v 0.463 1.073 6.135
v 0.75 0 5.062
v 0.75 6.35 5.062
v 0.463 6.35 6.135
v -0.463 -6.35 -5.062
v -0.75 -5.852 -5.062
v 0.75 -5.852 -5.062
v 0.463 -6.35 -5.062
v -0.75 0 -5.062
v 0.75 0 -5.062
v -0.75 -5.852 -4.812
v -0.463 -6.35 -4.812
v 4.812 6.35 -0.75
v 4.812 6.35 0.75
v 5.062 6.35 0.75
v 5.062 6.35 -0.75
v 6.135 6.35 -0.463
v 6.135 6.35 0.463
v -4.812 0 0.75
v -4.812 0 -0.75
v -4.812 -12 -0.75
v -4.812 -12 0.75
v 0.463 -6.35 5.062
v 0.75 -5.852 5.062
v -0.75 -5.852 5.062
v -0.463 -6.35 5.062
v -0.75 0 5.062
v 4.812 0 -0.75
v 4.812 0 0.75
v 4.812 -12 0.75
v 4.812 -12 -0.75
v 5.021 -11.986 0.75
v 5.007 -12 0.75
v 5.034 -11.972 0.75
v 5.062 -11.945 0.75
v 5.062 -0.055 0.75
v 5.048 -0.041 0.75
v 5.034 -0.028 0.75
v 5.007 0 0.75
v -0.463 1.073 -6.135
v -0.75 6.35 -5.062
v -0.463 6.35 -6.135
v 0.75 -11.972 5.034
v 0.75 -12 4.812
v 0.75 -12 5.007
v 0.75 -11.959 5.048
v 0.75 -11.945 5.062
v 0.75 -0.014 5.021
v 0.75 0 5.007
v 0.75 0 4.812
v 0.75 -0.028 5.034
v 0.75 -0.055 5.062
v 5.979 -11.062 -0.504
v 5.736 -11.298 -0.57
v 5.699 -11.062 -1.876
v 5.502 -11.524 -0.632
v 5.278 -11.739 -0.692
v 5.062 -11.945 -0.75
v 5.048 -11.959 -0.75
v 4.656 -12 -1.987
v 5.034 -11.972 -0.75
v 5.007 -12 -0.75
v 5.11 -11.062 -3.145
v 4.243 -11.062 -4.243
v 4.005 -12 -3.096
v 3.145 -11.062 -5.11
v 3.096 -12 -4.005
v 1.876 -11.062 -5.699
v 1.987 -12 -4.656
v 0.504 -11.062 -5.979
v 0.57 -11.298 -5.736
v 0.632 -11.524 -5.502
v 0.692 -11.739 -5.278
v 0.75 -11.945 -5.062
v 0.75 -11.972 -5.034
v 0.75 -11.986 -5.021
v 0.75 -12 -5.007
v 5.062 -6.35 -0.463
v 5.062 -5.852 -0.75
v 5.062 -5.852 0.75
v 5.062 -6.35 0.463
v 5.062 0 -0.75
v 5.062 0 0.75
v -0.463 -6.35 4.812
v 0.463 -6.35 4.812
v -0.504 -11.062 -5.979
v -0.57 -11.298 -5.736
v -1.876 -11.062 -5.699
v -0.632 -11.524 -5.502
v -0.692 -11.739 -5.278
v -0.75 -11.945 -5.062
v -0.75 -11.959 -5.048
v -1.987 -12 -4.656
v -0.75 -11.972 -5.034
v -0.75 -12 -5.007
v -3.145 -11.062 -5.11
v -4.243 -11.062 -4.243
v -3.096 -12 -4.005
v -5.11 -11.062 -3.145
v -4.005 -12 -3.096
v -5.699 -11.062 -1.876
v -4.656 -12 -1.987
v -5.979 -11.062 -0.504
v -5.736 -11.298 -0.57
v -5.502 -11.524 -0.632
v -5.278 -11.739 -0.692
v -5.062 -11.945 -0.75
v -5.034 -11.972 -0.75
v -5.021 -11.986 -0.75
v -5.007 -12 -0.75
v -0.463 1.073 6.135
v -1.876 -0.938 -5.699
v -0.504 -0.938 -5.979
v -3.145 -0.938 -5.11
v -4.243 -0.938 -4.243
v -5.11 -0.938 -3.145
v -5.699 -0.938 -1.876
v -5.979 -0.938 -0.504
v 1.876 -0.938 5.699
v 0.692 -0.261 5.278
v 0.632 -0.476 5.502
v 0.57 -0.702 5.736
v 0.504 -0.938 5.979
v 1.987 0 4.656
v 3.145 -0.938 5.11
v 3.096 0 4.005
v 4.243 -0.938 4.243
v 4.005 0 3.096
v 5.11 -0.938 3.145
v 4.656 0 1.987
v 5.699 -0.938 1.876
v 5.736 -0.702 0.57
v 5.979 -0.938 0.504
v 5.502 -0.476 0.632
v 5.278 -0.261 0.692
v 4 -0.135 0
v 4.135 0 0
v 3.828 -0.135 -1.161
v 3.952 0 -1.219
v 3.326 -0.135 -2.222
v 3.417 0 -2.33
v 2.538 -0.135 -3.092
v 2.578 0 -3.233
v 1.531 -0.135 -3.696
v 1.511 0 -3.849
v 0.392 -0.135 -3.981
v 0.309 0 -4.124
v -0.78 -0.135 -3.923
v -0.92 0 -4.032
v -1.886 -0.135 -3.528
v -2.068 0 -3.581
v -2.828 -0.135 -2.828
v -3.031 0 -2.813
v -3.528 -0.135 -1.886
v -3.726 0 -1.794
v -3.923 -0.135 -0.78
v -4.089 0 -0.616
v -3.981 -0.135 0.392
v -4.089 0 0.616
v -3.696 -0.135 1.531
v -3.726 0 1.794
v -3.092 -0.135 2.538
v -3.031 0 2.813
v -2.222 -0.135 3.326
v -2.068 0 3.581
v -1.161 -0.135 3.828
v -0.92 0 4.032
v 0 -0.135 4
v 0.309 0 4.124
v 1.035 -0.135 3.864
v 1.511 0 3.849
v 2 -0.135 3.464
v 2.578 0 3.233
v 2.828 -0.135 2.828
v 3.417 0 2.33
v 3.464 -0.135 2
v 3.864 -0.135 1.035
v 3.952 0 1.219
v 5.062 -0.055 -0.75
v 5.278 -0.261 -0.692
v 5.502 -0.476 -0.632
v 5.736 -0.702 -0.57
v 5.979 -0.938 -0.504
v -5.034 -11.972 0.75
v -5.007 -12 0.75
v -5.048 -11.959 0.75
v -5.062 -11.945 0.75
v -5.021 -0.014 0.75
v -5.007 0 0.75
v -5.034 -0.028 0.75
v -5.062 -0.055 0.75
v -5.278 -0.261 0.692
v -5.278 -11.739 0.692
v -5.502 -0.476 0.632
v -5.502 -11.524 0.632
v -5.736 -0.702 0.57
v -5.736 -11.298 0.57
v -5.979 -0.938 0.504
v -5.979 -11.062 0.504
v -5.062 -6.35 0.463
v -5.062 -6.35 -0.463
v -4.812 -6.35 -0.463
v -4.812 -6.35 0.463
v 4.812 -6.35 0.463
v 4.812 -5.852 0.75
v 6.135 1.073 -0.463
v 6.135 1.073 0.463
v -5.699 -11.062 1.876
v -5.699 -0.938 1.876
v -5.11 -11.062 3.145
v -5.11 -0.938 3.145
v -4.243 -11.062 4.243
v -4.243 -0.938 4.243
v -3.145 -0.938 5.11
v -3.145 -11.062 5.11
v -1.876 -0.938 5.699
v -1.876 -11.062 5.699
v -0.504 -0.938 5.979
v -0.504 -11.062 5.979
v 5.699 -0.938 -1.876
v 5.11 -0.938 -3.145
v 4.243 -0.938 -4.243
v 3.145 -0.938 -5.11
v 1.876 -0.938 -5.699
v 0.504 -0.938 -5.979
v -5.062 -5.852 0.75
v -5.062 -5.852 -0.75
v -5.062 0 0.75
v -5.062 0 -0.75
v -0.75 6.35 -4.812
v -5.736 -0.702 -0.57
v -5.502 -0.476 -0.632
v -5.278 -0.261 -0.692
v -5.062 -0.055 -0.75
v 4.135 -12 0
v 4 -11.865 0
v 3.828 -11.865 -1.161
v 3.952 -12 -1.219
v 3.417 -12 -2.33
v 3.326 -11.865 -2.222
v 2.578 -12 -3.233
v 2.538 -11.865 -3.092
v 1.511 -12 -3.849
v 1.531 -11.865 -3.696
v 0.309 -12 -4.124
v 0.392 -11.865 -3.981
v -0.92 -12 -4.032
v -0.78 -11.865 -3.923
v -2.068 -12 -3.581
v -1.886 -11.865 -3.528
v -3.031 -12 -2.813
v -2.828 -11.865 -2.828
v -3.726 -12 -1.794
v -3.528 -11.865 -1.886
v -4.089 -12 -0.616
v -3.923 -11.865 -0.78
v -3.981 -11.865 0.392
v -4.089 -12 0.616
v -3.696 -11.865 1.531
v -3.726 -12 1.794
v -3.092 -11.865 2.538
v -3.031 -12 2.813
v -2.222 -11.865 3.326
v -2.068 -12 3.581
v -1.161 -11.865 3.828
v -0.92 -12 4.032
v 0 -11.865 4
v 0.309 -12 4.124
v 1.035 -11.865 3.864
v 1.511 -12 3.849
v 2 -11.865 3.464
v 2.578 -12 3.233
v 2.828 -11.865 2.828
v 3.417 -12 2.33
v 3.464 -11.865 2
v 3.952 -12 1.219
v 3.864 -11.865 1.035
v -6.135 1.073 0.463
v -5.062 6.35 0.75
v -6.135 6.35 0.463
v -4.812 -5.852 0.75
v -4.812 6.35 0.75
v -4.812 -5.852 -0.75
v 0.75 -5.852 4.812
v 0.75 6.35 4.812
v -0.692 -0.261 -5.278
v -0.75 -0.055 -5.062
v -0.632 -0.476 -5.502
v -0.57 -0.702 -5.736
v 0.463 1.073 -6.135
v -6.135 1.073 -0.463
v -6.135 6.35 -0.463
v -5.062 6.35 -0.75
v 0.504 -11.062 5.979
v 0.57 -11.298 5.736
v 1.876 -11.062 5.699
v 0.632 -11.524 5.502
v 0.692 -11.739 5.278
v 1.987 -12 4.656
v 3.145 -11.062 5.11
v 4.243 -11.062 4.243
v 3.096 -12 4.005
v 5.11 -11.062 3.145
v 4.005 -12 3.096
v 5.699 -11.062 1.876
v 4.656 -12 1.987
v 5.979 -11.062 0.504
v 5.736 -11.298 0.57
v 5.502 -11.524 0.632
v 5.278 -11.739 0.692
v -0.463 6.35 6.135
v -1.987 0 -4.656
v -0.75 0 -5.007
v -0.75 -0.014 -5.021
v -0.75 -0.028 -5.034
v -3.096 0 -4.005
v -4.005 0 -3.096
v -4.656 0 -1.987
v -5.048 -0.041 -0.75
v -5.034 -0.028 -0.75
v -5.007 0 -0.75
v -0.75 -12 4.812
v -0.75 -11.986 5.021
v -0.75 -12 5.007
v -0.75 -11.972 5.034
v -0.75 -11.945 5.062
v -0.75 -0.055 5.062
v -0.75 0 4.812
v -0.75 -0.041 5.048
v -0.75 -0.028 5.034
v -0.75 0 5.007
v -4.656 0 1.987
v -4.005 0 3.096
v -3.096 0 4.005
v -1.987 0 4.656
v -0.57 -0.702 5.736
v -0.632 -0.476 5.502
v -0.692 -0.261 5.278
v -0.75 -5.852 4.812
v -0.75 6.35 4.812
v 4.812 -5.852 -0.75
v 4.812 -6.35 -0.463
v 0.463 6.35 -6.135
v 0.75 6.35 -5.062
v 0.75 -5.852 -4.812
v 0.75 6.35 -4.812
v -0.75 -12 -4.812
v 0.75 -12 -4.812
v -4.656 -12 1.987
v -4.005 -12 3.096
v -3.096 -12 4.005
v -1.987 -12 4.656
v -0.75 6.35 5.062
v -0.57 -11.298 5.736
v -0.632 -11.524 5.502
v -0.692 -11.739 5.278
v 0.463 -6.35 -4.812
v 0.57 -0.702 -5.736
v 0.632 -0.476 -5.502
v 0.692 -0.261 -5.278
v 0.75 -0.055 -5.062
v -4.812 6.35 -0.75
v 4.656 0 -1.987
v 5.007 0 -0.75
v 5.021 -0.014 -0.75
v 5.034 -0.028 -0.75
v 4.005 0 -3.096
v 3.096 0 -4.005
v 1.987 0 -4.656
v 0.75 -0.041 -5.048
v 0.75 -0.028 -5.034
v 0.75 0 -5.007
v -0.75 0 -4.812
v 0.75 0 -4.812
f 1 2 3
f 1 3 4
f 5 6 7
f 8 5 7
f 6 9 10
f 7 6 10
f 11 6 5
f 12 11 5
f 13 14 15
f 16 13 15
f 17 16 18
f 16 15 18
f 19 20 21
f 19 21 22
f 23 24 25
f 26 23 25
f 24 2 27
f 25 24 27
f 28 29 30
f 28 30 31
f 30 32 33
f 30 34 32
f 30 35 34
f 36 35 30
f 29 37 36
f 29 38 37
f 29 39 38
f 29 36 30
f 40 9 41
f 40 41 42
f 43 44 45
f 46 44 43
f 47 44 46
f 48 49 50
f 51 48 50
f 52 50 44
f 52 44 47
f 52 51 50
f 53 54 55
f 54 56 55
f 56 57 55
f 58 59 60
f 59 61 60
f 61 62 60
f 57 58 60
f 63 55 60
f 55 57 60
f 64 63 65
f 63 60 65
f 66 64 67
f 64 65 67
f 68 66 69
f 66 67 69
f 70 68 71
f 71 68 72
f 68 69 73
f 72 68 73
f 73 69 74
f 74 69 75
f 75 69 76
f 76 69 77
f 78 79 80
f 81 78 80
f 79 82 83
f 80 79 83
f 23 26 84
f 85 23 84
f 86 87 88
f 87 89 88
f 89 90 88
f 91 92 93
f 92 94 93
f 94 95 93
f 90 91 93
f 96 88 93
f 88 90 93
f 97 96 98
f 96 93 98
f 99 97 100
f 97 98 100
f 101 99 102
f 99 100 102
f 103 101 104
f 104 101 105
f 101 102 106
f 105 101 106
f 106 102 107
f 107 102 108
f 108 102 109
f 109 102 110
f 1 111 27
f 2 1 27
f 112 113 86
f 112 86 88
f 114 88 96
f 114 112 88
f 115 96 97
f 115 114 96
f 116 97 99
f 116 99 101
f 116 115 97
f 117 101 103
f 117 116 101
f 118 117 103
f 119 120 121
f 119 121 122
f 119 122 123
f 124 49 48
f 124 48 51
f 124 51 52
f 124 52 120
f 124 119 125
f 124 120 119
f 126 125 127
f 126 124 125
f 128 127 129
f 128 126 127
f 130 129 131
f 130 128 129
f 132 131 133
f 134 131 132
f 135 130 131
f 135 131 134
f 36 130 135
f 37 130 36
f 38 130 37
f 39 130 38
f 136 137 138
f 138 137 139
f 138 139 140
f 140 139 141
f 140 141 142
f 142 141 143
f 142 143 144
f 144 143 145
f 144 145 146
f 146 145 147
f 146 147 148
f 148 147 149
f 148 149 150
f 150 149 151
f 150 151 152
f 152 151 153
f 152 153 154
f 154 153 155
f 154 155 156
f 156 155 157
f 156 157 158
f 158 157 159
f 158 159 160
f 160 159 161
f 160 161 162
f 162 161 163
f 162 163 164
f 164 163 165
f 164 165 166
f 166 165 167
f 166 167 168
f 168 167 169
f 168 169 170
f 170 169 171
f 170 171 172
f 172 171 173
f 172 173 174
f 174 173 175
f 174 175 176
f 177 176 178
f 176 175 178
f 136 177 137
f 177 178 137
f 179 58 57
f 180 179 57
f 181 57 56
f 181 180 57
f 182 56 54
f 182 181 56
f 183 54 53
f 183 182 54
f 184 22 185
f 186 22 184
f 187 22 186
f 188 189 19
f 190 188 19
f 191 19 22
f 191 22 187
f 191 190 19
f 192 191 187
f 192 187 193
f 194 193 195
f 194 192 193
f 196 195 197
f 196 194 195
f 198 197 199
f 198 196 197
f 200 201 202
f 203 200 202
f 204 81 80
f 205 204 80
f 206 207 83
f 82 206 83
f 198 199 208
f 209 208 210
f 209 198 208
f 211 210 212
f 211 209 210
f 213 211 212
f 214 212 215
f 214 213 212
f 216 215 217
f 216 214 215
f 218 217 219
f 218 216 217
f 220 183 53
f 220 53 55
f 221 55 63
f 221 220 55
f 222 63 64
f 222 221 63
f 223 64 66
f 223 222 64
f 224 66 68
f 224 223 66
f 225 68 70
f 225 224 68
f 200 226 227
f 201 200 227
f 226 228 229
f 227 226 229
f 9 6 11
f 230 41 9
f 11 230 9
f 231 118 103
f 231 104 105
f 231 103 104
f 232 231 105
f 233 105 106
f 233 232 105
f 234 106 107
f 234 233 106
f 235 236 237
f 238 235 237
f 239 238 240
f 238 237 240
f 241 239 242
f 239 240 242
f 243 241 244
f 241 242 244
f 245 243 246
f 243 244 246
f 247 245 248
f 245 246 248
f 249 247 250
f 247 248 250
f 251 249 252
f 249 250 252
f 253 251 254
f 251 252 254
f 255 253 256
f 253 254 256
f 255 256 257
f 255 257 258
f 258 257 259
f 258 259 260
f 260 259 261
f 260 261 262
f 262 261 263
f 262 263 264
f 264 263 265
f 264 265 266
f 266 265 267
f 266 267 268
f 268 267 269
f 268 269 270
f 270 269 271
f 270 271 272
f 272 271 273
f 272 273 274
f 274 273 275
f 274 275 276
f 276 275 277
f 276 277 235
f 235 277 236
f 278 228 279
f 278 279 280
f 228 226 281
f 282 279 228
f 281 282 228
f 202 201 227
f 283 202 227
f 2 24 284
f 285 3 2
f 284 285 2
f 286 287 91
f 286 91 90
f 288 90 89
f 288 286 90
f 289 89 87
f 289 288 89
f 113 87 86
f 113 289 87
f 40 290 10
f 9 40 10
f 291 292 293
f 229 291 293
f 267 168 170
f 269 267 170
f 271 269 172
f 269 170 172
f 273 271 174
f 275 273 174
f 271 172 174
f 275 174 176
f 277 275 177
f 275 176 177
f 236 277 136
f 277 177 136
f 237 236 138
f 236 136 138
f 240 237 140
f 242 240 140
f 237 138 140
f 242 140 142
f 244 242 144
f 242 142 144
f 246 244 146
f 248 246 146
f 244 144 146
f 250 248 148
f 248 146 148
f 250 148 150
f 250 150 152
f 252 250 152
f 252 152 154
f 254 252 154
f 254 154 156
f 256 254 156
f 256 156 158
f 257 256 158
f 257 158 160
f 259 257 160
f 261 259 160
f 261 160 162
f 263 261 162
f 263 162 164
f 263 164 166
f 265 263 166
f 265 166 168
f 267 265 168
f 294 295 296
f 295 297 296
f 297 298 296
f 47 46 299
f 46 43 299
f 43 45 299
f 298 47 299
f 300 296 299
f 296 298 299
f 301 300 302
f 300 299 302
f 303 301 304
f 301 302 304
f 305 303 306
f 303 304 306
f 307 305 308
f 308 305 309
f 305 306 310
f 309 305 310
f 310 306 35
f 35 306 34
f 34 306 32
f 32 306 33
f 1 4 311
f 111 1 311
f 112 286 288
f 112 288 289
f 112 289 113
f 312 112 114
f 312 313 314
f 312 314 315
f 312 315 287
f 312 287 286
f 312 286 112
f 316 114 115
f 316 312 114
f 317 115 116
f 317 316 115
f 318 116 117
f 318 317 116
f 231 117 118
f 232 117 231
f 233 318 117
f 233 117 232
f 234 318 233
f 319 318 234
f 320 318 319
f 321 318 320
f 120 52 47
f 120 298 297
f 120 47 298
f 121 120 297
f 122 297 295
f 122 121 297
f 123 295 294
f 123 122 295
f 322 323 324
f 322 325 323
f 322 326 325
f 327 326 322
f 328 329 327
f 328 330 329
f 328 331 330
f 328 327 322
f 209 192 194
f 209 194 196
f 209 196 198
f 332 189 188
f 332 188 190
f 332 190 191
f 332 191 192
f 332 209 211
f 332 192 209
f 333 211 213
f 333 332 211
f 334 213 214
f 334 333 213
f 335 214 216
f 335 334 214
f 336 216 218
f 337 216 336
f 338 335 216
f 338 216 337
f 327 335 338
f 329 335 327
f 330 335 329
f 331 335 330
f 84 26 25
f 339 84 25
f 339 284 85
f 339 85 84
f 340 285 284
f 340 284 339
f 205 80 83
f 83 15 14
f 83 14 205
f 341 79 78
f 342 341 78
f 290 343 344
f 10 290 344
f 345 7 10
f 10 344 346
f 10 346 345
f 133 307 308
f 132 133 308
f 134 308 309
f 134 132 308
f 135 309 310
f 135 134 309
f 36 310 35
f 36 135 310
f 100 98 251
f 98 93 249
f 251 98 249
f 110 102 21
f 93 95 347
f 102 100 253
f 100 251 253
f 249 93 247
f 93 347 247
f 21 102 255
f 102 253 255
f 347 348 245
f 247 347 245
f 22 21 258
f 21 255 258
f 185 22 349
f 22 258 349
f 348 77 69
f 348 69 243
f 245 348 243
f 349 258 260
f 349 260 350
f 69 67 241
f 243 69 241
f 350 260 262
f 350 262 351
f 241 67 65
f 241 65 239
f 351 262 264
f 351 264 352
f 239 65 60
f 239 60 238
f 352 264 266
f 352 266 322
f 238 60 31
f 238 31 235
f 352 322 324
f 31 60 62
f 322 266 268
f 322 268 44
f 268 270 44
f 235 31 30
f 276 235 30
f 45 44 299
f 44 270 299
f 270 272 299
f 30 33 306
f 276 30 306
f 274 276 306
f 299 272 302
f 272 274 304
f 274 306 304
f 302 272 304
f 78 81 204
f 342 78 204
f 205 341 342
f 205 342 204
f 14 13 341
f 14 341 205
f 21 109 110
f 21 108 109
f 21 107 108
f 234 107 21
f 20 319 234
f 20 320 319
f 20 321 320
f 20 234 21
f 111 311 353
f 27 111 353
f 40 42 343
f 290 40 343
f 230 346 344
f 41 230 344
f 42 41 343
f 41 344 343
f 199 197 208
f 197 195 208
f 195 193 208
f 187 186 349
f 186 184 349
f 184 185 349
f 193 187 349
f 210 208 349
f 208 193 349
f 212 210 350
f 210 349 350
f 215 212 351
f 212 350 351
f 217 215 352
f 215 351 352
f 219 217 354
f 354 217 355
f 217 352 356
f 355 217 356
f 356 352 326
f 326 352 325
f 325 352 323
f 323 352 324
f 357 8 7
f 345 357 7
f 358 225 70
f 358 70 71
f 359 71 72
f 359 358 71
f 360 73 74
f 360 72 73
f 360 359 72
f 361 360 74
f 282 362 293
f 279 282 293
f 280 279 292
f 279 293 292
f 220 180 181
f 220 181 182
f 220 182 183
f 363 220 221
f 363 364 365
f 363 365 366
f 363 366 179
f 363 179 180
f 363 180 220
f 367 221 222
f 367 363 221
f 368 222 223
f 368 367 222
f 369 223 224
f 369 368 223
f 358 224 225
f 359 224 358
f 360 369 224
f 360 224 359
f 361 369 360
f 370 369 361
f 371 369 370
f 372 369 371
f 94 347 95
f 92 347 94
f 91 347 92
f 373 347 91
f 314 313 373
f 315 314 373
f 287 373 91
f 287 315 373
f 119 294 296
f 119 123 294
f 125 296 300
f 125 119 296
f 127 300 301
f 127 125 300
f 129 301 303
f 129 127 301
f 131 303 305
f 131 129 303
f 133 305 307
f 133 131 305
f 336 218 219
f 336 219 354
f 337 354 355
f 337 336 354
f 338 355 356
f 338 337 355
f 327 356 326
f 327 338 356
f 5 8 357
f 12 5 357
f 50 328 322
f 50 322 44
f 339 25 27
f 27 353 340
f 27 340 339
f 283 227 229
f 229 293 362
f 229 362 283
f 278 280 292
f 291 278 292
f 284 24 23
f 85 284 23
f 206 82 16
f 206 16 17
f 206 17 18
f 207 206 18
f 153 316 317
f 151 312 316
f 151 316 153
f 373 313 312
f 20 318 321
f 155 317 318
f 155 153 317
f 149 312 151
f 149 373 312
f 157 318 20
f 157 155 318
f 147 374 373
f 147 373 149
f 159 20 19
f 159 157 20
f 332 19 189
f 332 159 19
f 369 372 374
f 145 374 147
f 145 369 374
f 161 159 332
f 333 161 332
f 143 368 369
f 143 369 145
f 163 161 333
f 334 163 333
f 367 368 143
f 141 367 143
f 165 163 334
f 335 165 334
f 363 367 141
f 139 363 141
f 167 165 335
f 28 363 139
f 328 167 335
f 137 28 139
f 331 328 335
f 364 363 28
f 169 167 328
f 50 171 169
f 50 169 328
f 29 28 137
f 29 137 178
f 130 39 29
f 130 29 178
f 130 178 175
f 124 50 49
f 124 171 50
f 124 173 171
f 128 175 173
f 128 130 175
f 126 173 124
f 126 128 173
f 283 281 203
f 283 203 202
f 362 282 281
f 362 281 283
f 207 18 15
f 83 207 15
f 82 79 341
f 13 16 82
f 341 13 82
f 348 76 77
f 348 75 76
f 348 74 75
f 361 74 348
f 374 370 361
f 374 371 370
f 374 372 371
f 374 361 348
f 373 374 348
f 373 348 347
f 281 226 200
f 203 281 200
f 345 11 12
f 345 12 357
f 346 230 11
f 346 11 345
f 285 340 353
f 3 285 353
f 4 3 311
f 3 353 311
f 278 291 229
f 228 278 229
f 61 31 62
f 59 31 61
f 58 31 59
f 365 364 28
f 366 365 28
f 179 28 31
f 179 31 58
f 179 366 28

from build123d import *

# Parameters (mm, degrees)
SKETCH3_R           = 6
EXTRUDE1_DEPTH      = 12
CHAMFER1_SIZE       = 0.9375
EXTRUDE2_DEPTH      = 15.696938457
CIRPATTERN1_COUNT   = 4
SKETCH6_R           = 4
EXTRUDE3_DEPTH      = 15.679610971
SKETCH12_W          = 0.25
SKETCH12_H          = 1.5
EXTRUDE6_DEPTH      = 6.35
EXTRUDE7_DEPTH      = 6.35
EXTRUDE8_DEPTH      = 15.744069903
EXTRUDE8_DEPTH_BACK = 15.744069903
EXTRUDE9_DEPTH      = 18.368211193
CIRPATTERN2_COUNT   = 4


# Read off the part's stored shape, not the designer's step: Extrude4, Extrude5
with BuildPart() as part:
    # Sketch3 → Extrude1 (new body)
    with BuildSketch(Plane(origin=(0, 0, 0), x_dir=(1, 0, 0), z_dir=(0, 1, 0))):
        with Locations(Location((0, 0, 0), (0, 0, 270))):
            Circle(SKETCH3_R)
    extrude(amount=-EXTRUDE1_DEPTH)

    # Chamfer1
    chamfer1_edges = [part.edges().sort_by_distance(p)[0] for p in [
        (0, 0, -6),
        (0, -12, -6),
    ]]
    chamfer(chamfer1_edges, length=CHAMFER1_SIZE)

    # Sketch11 → Extrude2 (cut, through all)
    with BuildSketch(Plane(origin=(0, 0, 0), x_dir=(1, 0, 0), z_dir=(0, 1, 0))):
        Polygon((-6, 0.498797632), (-5.0625, 0.75), (-4.8125, 0.75), (-4.8125, -0.75), (-5.0625, -0.75), (-6, -0.498797632), align=None)
    extrude2 = extrude(amount=-EXTRUDE2_DEPTH, mode=Mode.SUBTRACT)

    # CirPattern1: Extrude2 ×4 about axis
    cirpattern1_axis = Axis((0, 0, 0), (0, 1, 0))
    for i in range(1, CIRPATTERN1_COUNT):
        add(extrude2.rotate(cirpattern1_axis, i * 360 / CIRPATTERN1_COUNT), mode=Mode.SUBTRACT)

    # Sketch6 → Extrude3 (cut, through all)
    with BuildSketch(Plane(origin=(0, 0, 0), x_dir=(1, 0, 0), z_dir=(0, 1, 0))):
        with Locations(Location((0, 0, 0), (0, 0, 270))):
            Circle(SKETCH6_R)
    extrude(amount=-EXTRUDE3_DEPTH, mode=Mode.SUBTRACT)

    # Extrude4 outline → Extrude4 (revolve, cut)
    with BuildSketch(Plane.XY):
        Polygon((4, 0), (4, -0.135316469), (4.135316469, 0), align=None)
    revolve(axis=Axis((0, 0, 0), (0, 1, 0)), mode=Mode.SUBTRACT)

    # Extrude5 outline → Extrude5 (revolve, cut)
    with BuildSketch(Plane.XY):
        Polygon((4.135316469, -12), (4, -11.864683531), (4, -12), align=None)
    revolve(axis=Axis((0, 0, 0), (0, 1, 0)), mode=Mode.SUBTRACT)


with BuildPart() as body_2:
    # Sketch12 → Extrude6 (new, symmetric)
    with BuildSketch(Plane(origin=(0, 0, 0), x_dir=(1, 0, 0), z_dir=(0, 1, 0))):
        with Locations((-4.9375, 0)):
            Rectangle(SKETCH12_W, SKETCH12_H)
    extrude(amount=EXTRUDE6_DEPTH, both=True)

    # Sketch13 → Extrude7 (add)
    with BuildSketch(Plane(origin=(0, 6.35, 0), x_dir=(1, 0, 0), z_dir=(0, 1, 0))):
        Polygon((-6.135316469, 0.462539693), (-5.0625, 0.75), (-5.0625, -0.75), (-6.135316469, -0.462539693), align=None)
    extrude(amount=-EXTRUDE7_DEPTH)

    # Sketch14 → Extrude8 (cut, two sides: drawn at the far end of the back side and taken through both)
    with BuildSketch(Plane.XY.offset(-EXTRUDE8_DEPTH_BACK)):
        Polygon((-6.135316469, 0), (-6.135316469, 1.072816469), (-5.0625, 0), align=None)
    extrude(amount=EXTRUDE8_DEPTH + EXTRUDE8_DEPTH_BACK, mode=Mode.SUBTRACT)

    # Sketch15 → Extrude9 (cut, through all)
    with BuildSketch(Plane.ZY.offset(5.0625)):
        Polygon((-0.462539693, -6.35), (-0.75, -5.852104144), (-0.75, -6.35), align=None)
        Polygon((0.462539693, -6.35), (0.75, -6.35), (0.75, -5.852104144), align=None)
    extrude(amount=-EXTRUDE9_DEPTH, mode=Mode.SUBTRACT)


with BuildPart() as cirpattern2_1:
    # CirPattern2: pattern copy
    add(body_2.part.rotate(Axis((0, 0, 0), (0, 1, 0)), 1 * 360 / CIRPATTERN2_COUNT))


with BuildPart() as cirpattern2_2:
    # CirPattern2: pattern copy
    add(body_2.part.rotate(Axis((0, 0, 0), (0, 1, 0)), 2 * 360 / CIRPATTERN2_COUNT))


with BuildPart() as cirpattern2_3:
    # CirPattern2: pattern copy
    add(body_2.part.rotate(Axis((0, 0, 0), (0, 1, 0)), 3 * 360 / CIRPATTERN2_COUNT))


solid = Compound([part.part, body_2.part, cirpattern2_1.part, cirpattern2_2.part, cirpattern2_3.part])
